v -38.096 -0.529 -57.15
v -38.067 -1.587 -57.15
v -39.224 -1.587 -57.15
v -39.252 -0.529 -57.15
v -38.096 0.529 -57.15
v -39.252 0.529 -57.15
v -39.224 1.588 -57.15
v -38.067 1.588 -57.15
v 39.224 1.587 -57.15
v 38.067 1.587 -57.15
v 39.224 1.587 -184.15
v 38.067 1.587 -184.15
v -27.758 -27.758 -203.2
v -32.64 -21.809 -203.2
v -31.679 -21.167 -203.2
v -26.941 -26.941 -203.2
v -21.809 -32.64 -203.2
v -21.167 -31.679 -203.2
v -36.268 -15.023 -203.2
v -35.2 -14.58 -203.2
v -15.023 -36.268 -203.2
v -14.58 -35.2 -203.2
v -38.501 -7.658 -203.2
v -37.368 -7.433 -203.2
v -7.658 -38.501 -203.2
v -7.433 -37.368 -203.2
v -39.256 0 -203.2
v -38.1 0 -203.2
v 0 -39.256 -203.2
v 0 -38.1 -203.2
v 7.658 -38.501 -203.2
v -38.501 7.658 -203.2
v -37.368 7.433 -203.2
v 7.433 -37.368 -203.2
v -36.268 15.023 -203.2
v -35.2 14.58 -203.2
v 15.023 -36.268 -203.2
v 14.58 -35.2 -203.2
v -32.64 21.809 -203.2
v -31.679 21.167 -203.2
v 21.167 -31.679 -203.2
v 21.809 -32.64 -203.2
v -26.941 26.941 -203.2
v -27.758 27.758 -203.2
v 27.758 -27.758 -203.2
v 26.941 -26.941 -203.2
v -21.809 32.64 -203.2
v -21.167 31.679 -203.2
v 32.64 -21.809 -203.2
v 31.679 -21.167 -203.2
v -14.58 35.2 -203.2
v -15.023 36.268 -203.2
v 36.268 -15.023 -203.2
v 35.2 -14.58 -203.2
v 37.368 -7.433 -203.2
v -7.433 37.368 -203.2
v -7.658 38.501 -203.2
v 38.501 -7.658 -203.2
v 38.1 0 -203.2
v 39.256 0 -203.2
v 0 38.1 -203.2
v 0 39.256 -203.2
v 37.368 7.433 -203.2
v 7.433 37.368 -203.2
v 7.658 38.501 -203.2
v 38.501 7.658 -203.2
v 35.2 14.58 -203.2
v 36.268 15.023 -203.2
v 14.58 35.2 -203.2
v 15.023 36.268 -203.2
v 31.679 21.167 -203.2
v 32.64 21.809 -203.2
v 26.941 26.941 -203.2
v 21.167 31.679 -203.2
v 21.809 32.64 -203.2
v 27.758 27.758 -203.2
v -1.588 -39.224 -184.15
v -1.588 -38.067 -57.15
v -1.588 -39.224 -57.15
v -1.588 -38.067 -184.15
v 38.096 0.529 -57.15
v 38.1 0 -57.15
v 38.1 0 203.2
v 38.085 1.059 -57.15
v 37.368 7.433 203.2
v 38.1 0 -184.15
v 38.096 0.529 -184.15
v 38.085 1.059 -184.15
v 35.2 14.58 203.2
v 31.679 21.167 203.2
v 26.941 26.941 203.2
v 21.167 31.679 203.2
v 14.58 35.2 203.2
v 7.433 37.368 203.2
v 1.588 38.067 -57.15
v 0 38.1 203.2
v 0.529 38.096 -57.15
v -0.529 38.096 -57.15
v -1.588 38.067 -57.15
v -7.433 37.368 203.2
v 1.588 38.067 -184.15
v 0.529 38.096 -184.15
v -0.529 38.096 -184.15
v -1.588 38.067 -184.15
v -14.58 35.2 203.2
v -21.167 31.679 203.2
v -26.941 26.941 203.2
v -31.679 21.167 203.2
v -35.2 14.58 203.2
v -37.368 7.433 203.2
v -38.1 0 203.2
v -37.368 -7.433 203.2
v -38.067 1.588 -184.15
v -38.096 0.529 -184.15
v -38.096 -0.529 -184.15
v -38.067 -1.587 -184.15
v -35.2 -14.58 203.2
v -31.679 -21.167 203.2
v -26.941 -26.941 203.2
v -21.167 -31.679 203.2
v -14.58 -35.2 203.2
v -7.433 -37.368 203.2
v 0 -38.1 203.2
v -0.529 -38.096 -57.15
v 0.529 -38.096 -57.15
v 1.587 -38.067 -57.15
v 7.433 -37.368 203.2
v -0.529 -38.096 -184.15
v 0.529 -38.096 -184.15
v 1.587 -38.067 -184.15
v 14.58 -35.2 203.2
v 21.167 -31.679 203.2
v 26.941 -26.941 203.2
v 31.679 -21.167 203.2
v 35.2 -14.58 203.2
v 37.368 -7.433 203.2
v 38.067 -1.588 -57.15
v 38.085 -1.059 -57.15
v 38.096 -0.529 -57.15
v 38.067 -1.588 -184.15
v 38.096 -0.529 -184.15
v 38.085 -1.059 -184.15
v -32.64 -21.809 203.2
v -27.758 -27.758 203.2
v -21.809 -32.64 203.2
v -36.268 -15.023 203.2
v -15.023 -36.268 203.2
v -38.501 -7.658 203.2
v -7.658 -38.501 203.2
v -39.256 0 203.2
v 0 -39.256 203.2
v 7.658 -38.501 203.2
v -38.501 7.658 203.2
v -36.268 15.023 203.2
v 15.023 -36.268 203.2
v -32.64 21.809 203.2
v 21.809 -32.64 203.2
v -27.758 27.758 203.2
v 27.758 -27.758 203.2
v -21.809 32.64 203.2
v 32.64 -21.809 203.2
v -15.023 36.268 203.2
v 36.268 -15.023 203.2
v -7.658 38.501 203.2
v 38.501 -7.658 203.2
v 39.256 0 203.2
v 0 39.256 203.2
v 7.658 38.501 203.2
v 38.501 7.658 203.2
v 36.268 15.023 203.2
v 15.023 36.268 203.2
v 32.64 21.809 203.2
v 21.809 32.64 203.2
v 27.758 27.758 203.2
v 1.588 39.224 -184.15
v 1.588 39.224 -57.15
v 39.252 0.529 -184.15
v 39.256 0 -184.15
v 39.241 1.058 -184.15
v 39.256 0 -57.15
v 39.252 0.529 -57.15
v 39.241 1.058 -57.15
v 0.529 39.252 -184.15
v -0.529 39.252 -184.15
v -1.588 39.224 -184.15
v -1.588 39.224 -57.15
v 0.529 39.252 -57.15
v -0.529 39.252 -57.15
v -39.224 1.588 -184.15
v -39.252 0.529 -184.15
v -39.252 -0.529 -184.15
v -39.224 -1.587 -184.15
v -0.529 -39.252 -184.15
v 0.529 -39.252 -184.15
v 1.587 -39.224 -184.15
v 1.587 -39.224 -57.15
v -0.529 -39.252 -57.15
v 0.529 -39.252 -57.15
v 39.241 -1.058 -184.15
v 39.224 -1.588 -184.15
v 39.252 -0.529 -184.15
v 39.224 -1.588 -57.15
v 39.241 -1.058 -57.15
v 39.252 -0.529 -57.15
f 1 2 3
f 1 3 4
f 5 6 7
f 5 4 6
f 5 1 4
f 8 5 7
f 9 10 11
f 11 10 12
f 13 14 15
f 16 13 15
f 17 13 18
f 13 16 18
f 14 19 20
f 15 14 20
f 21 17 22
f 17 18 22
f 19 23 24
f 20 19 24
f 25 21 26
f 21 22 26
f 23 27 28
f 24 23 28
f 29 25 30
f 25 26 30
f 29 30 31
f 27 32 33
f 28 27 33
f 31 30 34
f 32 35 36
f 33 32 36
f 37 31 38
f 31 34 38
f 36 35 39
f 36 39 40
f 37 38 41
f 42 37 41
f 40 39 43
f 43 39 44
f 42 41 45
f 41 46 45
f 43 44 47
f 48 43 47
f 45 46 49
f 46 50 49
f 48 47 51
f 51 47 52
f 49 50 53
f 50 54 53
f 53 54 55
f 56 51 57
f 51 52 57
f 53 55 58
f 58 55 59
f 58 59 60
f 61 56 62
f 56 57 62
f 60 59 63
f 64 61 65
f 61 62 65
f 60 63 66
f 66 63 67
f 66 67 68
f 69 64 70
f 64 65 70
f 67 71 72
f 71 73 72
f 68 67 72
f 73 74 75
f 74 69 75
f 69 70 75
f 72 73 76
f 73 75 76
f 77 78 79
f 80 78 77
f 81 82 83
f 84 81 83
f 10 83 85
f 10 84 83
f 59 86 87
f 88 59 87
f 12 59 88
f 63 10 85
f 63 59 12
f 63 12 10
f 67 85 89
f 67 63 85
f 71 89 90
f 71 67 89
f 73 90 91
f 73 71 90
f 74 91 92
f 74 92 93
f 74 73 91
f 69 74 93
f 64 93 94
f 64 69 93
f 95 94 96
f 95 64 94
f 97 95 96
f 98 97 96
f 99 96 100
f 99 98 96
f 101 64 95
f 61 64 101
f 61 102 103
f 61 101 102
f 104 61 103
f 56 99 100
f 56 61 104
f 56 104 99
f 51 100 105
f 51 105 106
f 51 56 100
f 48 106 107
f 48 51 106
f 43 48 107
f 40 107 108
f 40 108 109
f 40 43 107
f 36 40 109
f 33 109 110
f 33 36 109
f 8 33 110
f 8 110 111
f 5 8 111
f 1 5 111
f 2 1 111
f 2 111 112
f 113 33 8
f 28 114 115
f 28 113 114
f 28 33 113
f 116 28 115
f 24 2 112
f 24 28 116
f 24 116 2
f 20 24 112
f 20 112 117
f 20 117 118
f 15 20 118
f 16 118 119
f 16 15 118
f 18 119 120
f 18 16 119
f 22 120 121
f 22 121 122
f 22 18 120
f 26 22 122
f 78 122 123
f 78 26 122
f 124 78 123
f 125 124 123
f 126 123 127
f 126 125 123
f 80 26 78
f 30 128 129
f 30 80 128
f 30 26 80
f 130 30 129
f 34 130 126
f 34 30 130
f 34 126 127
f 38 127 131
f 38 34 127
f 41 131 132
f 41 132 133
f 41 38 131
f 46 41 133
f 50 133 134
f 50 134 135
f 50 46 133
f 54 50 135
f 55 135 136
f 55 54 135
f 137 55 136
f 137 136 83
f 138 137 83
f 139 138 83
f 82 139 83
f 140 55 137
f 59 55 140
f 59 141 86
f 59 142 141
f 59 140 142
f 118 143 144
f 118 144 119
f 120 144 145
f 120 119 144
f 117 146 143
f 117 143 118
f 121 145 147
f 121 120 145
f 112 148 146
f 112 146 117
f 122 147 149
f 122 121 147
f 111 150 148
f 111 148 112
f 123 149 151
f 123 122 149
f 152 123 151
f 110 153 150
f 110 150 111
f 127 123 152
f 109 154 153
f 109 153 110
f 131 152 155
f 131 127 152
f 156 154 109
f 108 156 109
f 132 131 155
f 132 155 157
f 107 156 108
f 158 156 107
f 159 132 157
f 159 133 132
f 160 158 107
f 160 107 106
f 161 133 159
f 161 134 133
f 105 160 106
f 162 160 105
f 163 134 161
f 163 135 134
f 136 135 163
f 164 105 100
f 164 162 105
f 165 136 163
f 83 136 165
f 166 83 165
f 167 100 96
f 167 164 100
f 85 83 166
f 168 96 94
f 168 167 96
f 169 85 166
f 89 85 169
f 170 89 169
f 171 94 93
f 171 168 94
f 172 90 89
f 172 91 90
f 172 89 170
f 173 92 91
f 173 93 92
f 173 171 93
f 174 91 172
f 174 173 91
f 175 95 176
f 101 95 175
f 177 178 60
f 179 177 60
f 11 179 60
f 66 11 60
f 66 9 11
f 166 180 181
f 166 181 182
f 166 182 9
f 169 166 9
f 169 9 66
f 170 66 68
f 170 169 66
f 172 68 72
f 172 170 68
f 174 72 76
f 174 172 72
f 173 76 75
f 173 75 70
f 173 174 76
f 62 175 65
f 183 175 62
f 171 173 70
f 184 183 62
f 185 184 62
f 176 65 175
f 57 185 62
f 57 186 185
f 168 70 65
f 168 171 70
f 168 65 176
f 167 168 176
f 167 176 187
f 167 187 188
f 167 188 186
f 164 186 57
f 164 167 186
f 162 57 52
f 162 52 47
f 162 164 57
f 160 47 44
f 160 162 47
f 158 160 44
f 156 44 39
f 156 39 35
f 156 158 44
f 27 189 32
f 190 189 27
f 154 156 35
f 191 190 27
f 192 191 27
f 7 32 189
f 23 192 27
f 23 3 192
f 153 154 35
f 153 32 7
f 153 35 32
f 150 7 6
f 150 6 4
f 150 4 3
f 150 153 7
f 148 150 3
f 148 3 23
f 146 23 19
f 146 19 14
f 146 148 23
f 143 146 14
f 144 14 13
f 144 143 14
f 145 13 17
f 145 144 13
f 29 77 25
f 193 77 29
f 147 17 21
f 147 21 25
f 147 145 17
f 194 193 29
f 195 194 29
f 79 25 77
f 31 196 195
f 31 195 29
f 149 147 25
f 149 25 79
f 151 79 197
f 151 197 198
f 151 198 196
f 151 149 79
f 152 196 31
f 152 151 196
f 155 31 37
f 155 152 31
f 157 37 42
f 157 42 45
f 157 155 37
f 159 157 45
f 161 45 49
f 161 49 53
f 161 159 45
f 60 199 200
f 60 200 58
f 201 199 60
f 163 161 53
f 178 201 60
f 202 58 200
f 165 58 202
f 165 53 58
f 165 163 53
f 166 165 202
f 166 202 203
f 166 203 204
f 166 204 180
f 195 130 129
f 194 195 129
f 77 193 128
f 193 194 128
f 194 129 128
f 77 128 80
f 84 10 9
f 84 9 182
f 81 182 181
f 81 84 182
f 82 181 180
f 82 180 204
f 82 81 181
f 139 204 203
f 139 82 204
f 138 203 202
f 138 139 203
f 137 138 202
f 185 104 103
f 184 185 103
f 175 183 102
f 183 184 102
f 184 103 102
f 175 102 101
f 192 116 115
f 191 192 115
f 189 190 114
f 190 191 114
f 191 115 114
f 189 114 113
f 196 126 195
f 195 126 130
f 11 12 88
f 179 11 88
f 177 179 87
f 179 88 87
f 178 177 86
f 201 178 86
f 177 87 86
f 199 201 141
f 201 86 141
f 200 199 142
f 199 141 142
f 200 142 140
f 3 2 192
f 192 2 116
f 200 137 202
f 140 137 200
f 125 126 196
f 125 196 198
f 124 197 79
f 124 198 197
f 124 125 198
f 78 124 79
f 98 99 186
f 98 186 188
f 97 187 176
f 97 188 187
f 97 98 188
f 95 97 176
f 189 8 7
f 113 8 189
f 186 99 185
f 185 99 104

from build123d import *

# Parameters (mm, degrees)
SKETCH1_R           = 39.2557
SKETCH1_R_2         = 38.1
BOSS_EXTRUDE1_DEPTH = 203.2
SKETCH3_W           = 3.175
SKETCH3_H           = 127
CUT_EXTRUDE1_DEPTH  = 40.2557
CIRPATTERN1_COUNT   = 4


with BuildPart() as part:
    # Sketch1 → Boss-Extrude1 (new body, symmetric)
    with BuildSketch(Plane.XY):
        Circle(SKETCH1_R)
        Circle(SKETCH1_R_2, mode=Mode.SUBTRACT)
    extrude(amount=BOSS_EXTRUDE1_DEPTH, both=True)

    # Sketch3 → Cut-Extrude1 (cut, through all)
    with BuildSketch(Plane(origin=(0, 0, 0), x_dir=(1, 0, 0), z_dir=(0, 1, 0))):
        with Locations((0, 120.65)):
            Rectangle(SKETCH3_W, SKETCH3_H)
    cut_extrude1 = extrude(amount=CUT_EXTRUDE1_DEPTH, mode=Mode.SUBTRACT)

    # CirPattern1: Cut-Extrude1 ×4 about axis
    cirpattern1_axis = Axis((0, 0, 0), (0, 0, 1))
    for i in range(1, CIRPATTERN1_COUNT):
        add(cut_extrude1.rotate(cirpattern1_axis, i * 360 / CIRPATTERN1_COUNT), mode=Mode.SUBTRACT)


solid = part.part
